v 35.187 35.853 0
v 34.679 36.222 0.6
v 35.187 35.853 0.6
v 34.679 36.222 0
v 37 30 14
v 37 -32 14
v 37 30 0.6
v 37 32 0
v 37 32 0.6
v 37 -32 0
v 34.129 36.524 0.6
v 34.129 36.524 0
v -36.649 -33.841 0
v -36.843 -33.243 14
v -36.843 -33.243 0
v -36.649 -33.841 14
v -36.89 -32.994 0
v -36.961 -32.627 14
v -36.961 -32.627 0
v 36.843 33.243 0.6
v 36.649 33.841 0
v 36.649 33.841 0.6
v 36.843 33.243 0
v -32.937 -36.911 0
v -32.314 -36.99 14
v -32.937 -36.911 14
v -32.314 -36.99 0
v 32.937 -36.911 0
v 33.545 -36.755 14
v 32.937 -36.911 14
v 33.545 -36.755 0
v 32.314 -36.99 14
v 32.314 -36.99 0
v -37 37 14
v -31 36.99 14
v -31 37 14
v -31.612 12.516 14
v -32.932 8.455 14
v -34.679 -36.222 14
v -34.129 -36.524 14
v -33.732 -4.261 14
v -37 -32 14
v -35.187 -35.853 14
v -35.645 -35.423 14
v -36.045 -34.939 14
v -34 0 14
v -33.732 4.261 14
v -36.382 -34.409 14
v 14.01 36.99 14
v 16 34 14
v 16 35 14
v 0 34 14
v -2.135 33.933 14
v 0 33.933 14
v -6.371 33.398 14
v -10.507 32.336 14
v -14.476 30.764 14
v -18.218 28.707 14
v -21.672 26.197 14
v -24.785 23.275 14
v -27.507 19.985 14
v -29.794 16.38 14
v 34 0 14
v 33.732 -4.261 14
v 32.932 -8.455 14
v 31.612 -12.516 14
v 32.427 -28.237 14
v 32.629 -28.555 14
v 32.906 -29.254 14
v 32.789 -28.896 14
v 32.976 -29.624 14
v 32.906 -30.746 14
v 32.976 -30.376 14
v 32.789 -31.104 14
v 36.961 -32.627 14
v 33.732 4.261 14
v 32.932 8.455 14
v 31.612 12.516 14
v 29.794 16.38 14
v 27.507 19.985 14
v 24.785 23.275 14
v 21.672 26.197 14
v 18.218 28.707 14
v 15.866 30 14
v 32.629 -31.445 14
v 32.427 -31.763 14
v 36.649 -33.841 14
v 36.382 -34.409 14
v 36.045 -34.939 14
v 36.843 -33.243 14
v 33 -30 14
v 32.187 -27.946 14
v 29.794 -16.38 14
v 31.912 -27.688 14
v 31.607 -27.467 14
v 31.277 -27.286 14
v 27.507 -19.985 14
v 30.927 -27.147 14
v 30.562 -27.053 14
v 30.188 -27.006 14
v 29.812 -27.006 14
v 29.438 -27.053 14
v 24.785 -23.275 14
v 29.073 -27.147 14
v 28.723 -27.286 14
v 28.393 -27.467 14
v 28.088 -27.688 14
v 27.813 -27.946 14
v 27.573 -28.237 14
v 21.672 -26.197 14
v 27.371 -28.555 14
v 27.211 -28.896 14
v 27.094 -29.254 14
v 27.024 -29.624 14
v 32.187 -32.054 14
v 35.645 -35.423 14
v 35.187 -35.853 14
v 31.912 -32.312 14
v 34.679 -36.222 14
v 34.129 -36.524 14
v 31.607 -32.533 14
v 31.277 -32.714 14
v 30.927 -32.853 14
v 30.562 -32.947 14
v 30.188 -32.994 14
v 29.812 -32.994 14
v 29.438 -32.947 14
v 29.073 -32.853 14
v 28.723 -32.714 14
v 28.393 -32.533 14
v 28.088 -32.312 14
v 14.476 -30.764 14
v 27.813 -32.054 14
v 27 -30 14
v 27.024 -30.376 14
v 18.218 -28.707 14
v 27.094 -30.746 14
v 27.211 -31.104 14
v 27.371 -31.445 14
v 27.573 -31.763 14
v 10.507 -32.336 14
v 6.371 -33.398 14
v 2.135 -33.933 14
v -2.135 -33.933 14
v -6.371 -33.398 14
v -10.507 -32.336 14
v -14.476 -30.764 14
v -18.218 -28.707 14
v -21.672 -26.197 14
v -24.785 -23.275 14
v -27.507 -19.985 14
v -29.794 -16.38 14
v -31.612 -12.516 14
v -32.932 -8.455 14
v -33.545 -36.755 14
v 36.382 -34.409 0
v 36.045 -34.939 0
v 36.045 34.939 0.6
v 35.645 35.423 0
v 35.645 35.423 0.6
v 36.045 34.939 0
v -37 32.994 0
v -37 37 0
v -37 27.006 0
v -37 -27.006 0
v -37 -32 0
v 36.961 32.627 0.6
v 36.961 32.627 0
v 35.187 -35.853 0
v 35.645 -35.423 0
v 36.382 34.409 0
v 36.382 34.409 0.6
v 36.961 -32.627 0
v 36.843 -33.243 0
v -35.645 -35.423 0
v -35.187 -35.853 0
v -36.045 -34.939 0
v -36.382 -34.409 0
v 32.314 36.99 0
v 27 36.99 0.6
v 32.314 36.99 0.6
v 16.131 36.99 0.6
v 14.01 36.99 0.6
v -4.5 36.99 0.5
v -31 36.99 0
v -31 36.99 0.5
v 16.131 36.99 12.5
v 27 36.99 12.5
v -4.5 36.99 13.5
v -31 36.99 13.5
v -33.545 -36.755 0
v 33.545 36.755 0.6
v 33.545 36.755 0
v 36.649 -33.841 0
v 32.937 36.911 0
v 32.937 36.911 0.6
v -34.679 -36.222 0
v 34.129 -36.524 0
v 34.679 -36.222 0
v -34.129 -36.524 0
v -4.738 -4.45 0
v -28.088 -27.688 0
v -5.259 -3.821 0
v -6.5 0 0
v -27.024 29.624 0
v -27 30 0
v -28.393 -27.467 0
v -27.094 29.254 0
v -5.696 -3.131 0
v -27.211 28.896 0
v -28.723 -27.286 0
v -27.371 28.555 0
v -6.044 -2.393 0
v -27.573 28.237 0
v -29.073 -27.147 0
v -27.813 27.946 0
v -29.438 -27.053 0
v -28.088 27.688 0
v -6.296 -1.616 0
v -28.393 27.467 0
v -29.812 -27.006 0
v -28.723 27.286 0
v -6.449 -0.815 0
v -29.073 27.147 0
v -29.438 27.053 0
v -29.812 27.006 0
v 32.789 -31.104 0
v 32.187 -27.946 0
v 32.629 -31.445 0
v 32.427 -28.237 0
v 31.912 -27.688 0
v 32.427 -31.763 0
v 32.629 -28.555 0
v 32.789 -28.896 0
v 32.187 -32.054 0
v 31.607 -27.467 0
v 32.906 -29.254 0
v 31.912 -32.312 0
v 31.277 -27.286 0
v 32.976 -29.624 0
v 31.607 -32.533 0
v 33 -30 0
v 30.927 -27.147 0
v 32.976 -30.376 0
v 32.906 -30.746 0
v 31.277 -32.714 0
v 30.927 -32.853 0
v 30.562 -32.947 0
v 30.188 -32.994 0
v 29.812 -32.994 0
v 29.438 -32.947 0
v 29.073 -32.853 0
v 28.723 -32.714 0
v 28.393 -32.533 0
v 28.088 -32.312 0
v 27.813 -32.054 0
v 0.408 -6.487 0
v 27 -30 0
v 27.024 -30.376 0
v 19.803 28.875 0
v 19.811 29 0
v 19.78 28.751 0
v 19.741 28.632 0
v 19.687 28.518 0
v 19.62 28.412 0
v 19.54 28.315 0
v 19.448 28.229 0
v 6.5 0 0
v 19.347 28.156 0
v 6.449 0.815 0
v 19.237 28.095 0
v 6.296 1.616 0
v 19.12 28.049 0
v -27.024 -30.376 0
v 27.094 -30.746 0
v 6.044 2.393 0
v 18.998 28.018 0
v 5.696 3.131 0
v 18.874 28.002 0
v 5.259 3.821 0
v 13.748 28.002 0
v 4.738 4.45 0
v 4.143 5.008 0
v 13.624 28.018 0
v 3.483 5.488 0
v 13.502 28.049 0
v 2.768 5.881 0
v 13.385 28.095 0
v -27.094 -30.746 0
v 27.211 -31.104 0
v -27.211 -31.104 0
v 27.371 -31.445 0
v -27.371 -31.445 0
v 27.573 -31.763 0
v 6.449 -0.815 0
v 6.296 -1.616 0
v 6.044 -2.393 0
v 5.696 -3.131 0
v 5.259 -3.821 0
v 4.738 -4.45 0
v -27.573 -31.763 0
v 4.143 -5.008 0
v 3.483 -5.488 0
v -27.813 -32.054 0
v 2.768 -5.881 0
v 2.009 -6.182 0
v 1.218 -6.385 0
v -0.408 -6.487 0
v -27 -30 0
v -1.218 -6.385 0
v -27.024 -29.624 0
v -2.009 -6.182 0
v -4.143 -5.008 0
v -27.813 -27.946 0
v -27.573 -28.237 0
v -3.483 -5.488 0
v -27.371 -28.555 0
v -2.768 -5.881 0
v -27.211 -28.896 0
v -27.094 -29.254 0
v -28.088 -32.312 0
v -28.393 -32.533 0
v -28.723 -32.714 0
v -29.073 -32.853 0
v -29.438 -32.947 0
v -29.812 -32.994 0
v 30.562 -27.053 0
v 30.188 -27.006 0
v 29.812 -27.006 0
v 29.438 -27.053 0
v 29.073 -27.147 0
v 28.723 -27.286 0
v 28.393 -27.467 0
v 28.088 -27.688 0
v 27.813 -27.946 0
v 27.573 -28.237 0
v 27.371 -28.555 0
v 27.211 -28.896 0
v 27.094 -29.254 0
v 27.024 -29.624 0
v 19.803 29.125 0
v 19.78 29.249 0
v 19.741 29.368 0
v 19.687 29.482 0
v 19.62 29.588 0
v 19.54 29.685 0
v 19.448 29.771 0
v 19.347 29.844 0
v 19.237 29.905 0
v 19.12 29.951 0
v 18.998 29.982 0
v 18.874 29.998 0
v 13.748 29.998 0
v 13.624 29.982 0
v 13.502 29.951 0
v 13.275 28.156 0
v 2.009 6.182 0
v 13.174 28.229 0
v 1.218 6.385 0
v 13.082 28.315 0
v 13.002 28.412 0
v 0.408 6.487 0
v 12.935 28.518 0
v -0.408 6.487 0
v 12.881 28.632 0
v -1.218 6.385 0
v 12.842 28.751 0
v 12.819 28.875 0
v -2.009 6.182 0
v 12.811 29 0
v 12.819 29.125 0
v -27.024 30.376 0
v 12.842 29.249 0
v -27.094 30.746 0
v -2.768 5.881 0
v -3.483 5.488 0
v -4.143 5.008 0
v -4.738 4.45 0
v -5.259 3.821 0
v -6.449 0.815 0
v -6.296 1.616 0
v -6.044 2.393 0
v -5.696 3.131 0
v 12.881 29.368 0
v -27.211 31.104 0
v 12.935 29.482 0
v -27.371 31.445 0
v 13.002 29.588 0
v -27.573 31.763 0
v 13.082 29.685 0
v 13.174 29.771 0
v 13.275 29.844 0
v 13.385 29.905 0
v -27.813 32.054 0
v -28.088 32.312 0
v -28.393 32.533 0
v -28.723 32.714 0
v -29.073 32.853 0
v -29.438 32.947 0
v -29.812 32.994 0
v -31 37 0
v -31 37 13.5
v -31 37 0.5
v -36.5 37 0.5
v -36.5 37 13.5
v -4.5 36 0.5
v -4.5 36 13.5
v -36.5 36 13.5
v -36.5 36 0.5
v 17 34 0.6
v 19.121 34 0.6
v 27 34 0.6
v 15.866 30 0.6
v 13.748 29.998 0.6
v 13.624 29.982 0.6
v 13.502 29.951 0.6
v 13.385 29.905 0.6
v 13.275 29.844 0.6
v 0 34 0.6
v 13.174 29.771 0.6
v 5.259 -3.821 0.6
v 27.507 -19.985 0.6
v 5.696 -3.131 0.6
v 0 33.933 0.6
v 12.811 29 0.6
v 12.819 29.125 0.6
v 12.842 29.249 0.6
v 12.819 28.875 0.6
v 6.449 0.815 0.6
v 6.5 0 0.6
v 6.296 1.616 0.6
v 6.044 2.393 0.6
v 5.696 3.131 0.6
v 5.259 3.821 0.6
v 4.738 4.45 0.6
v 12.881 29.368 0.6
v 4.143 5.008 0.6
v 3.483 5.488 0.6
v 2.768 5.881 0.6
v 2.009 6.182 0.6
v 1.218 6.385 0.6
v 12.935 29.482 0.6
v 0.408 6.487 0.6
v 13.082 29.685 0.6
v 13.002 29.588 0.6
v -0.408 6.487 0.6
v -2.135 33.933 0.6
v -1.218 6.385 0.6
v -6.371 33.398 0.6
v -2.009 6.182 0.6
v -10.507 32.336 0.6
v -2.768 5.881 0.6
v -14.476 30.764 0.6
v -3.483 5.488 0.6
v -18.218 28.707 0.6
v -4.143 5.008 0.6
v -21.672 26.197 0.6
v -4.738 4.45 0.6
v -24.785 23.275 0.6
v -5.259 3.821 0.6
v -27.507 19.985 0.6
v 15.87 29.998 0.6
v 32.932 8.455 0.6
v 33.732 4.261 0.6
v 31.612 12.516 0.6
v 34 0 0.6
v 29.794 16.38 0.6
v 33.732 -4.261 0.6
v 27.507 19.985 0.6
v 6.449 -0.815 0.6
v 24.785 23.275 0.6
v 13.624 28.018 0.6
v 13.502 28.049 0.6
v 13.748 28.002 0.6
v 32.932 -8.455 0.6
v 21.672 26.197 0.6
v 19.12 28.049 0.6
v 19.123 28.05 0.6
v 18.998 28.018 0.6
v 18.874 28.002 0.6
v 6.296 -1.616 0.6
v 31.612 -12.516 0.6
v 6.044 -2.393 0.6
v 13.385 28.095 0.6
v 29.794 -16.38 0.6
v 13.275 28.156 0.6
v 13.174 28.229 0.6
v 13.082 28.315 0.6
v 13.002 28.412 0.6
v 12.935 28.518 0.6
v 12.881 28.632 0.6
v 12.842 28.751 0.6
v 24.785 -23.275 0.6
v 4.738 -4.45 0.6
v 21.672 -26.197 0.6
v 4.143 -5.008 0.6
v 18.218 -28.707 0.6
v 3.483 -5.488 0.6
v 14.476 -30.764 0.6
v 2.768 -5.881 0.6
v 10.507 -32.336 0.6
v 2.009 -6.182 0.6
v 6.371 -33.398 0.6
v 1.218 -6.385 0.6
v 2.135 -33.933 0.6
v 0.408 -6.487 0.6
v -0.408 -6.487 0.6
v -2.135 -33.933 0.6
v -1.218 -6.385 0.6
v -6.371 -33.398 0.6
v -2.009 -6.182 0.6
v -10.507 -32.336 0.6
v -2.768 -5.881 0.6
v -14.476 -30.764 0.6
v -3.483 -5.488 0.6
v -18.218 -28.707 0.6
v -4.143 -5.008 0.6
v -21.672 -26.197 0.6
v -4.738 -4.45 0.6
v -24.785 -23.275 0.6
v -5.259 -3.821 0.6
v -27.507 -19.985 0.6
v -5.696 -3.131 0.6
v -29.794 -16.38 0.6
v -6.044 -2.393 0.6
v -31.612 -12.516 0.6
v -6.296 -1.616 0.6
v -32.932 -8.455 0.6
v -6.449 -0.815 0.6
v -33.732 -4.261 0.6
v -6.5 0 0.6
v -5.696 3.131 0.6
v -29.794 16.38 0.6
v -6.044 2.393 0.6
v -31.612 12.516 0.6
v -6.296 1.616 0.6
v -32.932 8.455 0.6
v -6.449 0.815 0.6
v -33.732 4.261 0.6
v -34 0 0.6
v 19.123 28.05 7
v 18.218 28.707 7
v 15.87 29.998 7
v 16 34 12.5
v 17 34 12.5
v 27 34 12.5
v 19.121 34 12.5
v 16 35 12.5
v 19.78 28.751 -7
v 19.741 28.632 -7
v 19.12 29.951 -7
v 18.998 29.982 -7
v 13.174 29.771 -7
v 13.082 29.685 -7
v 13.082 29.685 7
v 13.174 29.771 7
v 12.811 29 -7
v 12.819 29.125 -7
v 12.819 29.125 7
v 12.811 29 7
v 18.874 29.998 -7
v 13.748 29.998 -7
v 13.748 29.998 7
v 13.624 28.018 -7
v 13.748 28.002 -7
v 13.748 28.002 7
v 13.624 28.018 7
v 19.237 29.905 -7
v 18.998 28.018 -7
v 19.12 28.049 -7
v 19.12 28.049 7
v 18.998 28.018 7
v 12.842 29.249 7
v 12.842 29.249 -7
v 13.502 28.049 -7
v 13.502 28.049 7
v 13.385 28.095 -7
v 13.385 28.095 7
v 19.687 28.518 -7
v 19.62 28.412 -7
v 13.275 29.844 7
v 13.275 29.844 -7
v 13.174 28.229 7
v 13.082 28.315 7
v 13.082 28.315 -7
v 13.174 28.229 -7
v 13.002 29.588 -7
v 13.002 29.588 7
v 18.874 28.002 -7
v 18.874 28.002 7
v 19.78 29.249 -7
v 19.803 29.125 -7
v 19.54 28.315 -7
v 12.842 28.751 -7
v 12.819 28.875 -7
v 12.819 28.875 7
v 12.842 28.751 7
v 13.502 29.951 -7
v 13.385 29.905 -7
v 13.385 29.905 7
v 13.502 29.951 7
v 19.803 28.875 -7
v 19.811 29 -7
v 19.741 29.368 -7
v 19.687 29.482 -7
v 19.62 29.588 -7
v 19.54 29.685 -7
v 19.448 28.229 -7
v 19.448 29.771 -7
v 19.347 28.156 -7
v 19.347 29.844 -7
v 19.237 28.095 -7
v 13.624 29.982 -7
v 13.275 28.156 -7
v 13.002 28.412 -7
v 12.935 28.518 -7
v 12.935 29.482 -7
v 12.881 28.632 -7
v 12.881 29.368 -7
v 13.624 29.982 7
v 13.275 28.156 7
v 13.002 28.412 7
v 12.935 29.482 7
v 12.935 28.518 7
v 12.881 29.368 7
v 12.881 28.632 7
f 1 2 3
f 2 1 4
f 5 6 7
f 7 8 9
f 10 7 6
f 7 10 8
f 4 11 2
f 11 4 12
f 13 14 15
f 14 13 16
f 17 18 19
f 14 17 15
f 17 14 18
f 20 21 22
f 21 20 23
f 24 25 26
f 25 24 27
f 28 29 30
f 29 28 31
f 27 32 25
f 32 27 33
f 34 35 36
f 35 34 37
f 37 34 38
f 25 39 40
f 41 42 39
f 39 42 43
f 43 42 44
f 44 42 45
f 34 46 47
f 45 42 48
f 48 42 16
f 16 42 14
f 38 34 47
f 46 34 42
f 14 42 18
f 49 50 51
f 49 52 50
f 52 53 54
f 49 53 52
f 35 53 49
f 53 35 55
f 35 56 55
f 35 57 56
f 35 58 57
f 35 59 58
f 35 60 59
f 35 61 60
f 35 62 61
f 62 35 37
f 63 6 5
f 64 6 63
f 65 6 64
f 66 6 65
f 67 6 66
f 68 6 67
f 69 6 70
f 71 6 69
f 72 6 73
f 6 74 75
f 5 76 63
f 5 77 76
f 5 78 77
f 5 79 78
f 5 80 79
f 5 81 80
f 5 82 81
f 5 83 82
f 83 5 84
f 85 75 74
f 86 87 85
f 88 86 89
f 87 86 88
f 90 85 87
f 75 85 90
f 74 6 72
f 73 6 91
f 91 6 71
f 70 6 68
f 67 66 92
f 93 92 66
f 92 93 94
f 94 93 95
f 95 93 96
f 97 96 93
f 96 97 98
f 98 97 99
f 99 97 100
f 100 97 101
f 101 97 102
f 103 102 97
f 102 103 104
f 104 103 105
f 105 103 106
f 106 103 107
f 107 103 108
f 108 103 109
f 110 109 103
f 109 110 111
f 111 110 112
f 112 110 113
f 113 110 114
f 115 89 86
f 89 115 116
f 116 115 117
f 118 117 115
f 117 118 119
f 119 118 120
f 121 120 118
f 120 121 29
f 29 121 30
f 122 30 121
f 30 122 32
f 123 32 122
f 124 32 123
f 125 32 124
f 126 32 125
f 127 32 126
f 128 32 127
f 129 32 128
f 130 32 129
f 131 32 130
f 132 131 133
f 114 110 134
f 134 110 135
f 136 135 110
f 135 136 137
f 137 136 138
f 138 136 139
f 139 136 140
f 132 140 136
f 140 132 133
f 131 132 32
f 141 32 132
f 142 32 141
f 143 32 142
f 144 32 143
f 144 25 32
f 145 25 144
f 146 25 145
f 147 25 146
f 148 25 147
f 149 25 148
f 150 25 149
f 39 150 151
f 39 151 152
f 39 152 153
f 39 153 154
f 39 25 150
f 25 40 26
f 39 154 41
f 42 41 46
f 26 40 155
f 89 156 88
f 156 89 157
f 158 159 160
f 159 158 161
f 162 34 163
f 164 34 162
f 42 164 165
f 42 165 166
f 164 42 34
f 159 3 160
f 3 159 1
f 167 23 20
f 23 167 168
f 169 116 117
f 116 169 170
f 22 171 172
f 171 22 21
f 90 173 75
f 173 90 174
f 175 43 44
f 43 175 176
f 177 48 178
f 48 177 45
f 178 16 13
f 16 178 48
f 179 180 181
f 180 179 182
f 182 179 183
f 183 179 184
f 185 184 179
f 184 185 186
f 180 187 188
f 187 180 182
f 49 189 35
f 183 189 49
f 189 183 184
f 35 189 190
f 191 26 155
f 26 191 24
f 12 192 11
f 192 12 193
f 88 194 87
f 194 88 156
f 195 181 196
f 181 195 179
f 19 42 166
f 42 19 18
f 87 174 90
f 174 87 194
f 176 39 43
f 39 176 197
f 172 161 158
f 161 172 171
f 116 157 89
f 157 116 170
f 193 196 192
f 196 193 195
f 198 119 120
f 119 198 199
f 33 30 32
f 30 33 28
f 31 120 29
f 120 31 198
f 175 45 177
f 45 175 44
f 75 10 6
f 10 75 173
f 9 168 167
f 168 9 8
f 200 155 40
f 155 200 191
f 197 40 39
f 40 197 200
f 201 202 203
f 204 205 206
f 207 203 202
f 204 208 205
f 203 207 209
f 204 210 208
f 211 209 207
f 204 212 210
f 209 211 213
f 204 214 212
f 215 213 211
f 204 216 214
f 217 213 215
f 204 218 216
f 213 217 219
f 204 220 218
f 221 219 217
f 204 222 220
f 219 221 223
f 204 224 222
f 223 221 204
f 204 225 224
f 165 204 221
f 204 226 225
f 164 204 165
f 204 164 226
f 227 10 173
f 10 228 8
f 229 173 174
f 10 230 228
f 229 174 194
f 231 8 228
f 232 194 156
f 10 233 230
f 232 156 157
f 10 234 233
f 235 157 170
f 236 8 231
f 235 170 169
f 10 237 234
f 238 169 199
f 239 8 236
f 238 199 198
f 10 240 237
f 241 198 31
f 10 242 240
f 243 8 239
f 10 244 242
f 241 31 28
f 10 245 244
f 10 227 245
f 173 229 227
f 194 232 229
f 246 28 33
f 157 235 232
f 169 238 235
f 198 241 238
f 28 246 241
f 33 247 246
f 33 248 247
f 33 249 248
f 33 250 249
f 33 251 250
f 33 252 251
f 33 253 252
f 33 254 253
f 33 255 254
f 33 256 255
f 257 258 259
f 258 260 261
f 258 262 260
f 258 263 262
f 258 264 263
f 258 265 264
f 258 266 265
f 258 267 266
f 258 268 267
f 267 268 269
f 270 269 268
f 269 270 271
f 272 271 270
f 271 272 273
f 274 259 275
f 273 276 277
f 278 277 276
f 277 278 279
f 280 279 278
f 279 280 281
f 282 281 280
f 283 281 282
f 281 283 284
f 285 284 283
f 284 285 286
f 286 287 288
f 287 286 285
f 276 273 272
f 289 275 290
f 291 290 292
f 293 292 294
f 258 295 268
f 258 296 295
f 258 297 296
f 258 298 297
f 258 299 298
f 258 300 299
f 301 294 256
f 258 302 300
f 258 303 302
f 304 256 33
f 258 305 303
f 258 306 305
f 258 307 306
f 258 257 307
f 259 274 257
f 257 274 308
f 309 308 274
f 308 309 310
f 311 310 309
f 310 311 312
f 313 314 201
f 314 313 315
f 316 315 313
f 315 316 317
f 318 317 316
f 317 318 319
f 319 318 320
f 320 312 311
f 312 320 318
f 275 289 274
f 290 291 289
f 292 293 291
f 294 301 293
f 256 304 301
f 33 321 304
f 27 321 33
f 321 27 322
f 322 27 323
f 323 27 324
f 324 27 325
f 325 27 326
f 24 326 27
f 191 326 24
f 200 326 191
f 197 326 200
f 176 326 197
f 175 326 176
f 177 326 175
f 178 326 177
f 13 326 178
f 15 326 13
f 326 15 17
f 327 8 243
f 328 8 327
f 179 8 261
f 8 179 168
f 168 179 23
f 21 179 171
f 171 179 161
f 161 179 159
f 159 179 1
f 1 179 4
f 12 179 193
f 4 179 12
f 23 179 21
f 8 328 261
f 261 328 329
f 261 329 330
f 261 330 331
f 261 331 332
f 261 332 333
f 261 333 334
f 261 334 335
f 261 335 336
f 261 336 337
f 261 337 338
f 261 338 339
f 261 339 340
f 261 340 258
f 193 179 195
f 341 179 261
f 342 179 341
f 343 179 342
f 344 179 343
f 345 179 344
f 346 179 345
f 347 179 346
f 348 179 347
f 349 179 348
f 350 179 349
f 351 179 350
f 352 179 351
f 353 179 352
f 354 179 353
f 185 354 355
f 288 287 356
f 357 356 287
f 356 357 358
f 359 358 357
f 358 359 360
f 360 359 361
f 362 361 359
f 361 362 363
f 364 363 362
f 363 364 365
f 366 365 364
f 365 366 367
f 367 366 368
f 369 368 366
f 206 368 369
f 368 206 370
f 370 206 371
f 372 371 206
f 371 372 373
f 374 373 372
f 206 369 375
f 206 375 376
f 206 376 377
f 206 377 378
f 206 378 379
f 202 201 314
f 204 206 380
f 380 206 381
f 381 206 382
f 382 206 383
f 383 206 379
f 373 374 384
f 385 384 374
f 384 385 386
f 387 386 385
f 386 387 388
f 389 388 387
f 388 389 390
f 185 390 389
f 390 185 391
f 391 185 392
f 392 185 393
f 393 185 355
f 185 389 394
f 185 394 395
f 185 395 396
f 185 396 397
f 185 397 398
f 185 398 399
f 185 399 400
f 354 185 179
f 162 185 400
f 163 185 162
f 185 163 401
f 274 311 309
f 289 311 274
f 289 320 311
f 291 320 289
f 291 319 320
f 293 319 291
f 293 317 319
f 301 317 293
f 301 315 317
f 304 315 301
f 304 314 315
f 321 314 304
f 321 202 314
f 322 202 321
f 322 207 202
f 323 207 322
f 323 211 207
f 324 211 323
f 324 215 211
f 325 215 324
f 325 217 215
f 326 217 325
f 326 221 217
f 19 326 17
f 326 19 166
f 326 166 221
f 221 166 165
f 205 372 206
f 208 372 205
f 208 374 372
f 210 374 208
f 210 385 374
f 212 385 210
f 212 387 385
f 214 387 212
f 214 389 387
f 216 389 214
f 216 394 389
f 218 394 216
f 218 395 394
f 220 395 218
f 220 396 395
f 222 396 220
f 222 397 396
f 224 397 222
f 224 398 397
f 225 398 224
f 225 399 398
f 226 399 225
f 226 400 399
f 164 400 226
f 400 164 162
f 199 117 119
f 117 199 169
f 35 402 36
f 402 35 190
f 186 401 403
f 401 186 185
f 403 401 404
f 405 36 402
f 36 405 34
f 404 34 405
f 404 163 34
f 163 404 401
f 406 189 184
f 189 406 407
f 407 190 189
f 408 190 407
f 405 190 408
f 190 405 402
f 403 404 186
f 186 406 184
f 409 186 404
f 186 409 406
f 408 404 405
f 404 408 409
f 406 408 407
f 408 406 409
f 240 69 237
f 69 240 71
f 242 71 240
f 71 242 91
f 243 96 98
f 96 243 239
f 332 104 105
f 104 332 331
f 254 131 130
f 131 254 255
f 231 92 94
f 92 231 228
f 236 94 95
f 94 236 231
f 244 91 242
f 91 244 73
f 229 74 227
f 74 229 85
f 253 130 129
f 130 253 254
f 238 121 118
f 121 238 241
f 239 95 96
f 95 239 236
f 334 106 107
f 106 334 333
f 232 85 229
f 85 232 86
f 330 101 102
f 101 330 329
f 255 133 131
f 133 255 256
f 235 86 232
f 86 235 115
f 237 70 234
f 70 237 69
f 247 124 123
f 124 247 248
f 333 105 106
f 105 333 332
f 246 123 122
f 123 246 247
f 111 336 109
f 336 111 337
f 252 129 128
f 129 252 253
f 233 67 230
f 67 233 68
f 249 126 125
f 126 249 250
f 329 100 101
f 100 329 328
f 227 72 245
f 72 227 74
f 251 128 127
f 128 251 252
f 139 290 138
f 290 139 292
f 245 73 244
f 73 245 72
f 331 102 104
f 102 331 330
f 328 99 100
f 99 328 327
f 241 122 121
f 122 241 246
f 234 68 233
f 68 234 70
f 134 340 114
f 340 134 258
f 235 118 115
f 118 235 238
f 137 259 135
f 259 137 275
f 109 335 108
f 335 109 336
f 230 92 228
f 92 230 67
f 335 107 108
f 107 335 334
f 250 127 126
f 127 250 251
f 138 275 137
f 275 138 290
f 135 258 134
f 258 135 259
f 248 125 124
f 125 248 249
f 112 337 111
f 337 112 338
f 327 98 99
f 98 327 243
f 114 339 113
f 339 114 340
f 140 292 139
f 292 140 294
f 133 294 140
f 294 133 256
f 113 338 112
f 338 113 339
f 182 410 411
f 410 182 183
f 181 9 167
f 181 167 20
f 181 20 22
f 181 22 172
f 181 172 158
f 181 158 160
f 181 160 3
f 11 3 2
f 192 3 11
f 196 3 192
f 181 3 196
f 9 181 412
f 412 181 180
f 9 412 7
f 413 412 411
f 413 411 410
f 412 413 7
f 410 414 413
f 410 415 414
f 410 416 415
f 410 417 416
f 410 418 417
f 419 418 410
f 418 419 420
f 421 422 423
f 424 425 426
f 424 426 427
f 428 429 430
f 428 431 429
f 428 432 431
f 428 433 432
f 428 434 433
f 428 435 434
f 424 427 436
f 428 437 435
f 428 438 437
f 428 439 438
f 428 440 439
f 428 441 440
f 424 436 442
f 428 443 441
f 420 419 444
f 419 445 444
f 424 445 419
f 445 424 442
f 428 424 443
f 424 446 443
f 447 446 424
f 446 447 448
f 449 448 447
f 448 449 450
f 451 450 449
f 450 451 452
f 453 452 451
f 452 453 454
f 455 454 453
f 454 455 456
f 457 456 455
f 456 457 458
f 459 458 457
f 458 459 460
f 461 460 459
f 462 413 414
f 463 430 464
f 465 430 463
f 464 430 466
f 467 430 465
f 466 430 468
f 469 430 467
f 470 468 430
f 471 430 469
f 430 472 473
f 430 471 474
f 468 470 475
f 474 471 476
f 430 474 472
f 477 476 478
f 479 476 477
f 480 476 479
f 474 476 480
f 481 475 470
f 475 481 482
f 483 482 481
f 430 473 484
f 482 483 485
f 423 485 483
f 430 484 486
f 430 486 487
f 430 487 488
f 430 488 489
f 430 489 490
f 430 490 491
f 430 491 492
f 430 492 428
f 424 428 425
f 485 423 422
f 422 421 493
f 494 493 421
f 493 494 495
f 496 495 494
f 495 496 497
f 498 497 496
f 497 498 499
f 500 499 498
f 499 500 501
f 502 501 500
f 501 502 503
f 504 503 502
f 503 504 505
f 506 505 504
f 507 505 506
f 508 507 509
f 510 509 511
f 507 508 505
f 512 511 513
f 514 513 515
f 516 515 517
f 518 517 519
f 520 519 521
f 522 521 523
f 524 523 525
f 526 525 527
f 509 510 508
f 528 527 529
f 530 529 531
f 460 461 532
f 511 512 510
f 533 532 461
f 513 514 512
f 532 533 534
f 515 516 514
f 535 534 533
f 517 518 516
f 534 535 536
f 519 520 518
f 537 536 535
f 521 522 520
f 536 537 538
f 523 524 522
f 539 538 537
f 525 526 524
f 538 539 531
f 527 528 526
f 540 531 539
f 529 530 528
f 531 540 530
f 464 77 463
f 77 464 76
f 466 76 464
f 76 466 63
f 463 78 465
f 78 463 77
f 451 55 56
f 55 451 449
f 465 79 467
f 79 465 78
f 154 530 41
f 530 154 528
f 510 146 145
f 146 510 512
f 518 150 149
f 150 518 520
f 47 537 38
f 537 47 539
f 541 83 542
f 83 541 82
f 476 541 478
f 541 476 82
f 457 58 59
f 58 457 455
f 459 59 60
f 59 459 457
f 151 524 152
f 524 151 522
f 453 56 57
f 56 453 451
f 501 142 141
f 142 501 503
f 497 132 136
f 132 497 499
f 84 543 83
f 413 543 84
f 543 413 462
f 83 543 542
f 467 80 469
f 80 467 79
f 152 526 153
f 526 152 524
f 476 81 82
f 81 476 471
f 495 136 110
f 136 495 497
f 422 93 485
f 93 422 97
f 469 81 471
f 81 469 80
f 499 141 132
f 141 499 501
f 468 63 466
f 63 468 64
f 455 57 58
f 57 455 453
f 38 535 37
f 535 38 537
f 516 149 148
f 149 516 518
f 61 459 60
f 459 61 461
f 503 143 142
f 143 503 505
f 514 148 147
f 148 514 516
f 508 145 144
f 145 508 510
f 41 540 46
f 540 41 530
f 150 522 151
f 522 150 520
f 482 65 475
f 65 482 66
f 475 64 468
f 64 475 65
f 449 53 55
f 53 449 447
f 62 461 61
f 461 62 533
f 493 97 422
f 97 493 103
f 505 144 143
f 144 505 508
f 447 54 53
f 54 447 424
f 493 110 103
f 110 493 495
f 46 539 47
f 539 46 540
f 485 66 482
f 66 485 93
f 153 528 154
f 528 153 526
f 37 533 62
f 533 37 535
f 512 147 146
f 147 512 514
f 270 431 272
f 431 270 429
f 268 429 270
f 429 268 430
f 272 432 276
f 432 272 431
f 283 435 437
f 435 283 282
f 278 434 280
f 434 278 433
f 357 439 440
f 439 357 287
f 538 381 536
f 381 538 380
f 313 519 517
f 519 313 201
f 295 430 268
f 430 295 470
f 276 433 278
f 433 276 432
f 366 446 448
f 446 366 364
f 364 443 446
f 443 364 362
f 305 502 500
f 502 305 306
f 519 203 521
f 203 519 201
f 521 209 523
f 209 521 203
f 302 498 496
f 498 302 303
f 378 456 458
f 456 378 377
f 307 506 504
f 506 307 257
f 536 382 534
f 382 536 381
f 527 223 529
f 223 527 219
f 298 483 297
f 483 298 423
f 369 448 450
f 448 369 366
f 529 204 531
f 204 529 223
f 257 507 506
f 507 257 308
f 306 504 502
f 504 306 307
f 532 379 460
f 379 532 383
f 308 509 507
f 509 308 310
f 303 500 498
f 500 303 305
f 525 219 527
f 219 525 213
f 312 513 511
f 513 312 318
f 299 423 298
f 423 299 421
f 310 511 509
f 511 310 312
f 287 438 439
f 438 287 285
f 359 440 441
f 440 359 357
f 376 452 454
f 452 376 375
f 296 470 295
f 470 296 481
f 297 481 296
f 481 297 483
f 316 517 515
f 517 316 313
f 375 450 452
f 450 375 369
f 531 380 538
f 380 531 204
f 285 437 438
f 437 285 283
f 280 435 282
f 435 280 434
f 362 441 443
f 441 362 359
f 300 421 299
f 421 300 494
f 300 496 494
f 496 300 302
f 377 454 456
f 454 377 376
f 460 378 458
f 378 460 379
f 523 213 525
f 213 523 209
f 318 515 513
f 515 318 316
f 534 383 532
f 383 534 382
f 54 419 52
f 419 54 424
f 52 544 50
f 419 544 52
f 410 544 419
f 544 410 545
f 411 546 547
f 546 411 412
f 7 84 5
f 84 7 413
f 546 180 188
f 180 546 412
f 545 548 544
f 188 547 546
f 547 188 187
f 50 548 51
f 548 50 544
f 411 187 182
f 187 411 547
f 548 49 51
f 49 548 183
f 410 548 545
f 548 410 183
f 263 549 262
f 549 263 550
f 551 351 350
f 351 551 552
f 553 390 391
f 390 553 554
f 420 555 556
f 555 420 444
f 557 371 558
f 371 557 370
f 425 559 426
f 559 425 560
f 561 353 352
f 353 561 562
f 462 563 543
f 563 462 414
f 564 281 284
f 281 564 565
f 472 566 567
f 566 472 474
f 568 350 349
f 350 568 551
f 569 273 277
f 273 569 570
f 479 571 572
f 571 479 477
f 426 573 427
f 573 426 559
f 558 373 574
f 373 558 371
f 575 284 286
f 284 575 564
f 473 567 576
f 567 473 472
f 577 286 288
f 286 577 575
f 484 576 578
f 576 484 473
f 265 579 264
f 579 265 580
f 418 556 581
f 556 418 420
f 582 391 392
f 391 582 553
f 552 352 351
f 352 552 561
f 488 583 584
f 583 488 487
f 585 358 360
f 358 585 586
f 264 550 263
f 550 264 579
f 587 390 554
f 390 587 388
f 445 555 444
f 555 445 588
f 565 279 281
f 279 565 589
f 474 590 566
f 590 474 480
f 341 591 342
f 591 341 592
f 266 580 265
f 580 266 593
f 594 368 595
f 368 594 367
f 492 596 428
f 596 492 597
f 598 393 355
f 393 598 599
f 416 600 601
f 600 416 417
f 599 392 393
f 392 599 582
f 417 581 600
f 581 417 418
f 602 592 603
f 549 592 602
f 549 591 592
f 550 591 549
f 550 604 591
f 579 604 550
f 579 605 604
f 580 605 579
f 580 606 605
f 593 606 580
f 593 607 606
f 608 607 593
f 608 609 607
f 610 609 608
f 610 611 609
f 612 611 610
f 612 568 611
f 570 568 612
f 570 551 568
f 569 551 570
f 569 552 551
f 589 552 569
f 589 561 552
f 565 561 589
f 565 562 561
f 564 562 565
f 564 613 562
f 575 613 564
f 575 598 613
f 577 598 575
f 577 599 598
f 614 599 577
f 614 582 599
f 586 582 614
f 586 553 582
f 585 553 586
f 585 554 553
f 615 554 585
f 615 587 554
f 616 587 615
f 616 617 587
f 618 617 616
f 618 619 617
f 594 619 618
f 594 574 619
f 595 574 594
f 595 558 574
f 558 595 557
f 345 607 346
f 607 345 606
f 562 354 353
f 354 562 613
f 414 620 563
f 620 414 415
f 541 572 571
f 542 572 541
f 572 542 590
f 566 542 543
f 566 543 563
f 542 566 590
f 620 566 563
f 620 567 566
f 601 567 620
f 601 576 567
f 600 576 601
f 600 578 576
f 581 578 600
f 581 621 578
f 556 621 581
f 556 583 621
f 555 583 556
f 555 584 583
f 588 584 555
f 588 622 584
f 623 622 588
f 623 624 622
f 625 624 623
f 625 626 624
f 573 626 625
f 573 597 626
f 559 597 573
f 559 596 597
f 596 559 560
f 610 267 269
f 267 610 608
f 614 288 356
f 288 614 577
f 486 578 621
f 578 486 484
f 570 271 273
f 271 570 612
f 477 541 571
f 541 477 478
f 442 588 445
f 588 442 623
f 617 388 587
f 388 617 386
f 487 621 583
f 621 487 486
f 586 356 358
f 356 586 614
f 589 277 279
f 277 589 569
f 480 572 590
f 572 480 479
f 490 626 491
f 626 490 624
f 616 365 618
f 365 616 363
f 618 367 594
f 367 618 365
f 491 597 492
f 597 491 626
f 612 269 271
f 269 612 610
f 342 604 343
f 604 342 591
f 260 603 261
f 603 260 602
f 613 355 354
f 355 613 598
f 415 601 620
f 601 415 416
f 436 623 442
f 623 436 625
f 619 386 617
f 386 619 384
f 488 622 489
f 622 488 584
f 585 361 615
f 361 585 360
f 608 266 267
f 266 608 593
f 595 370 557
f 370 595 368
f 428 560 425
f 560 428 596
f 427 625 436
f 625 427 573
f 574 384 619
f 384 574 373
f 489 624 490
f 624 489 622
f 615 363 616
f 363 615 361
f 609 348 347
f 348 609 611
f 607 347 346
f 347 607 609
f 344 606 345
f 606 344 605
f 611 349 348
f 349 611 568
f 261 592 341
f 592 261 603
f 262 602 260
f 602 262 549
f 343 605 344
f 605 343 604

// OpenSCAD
$fn = 50;


union() {
	difference() {
		union() {
			hull() {
				translate(v = [-32.0000000000, 32.0000000000, 0]) {
					cylinder(h = 14, r = 5);
				}
				translate(v = [32.0000000000, 32.0000000000, 0]) {
					cylinder(h = 14, r = 5);
				}
				translate(v = [-32.0000000000, -32.0000000000, 0]) {
					cylinder(h = 14, r = 5);
				}
				translate(v = [32.0000000000, -32.0000000000, 0]) {
					cylinder(h = 14, r = 5);
				}
			}
			translate(v = [-37.0000000000, 31.0000000000, 0]) {
				cube(size = [6, 6, 14]);
			}
		}
		union() {
			translate(v = [-37.5000000000, -30.0000000000, -250.0000000000]) {
				rotate(a = [0, 0, 0]) {
					difference() {
						union() {
							hull() {
								translate(v = [7.5000000000, 0, 0]) {
									cylinder(h = 250, r = 3.0000000000, r1 = 3.0000000000, r2 = 3.0000000000);
								}
								translate(v = [-7.5000000000, 0, 0]) {
									cylinder(h = 250, r = 3.0000000000, r1 = 3.0000000000, r2 = 3.0000000000);
								}
							}
						}
						union();
					}
				}
			}
			translate(v = [-37.5000000000, 30.0000000000, -250.0000000000]) {
				rotate(a = [0, 0, 0]) {
					difference() {
						union() {
							hull() {
								translate(v = [7.5000000000, 0, 0]) {
									cylinder(h = 250, r = 3.0000000000, r1 = 3.0000000000, r2 = 3.0000000000);
								}
								translate(v = [-7.5000000000, 0, 0]) {
									cylinder(h = 250, r = 3.0000000000, r1 = 3.0000000000, r2 = 3.0000000000);
								}
							}
						}
						union();
					}
				}
			}
			translate(v = [-36.5000000000, 36.0000000000, 0.5000000000]) {
				cube(size = [32, 1, 13.0000000000]);
			}
			translate(v = [30.0000000000, -30.0000000000, 0]) {
				cylinder(h = 100, r = 3.0000000000);
			}
			translate(v = [0, 0, 0.6000000000]) {
				cylinder(h = 16.4000000000, r = 34.0000000000);
			}
			translate(v = [0, 0, -7.0000000000]) {
				cylinder(h = 14, r = 6.5000000000);
			}
			translate(v = [0.0000000000, 30.0000000000, 0.6000000000]) {
				cube(size = [37.0000000000, 4, 16.4000000000]);
			}
			translate(v = [27.0000000000, 30.0000000000, 0.6000000000]) {
				cube(size = [10, 7, 16.4000000000]);
			}
			translate(v = [16.0000000000, 30.0000000000, 12.5000000000]) {
				cube(size = [21, 7, 1.5000000000]);
			}
			translate(v = [13.2500000000, 37.7500000000, 0.6000000000]) {
				rotate(a = [0, 0, -45]) {
					cube(size = [7.5000000000, 1.5000000000, 16.4000000000]);
				}
			}
			translate(v = [7.0610000000, 28.0000000000, 0.6000000000]) {
				cube(size = [7.5000000000, 2, 13.4000000000]);
			}
		}
	}
	union() {
		translate(v = [16.3110000000, 29.0000000000, -7.0000000000]) {
			rotate(a = [0, 0, 0]) {
				difference() {
					union() {
						#hull() {
							#translate(v = [2.5000000000, 0, 0]) {
								cylinder(h = 14, r = 1.0000000000, r1 = 1.0000000000, r2 = 1.0000000000);
							}
							#translate(v = [-2.5000000000, 0, 0]) {
								cylinder(h = 14, r = 1.0000000000, r1 = 1.0000000000, r2 = 1.0000000000);
							}
						}
					}
					union();
				}
			}
		}
	}
}
